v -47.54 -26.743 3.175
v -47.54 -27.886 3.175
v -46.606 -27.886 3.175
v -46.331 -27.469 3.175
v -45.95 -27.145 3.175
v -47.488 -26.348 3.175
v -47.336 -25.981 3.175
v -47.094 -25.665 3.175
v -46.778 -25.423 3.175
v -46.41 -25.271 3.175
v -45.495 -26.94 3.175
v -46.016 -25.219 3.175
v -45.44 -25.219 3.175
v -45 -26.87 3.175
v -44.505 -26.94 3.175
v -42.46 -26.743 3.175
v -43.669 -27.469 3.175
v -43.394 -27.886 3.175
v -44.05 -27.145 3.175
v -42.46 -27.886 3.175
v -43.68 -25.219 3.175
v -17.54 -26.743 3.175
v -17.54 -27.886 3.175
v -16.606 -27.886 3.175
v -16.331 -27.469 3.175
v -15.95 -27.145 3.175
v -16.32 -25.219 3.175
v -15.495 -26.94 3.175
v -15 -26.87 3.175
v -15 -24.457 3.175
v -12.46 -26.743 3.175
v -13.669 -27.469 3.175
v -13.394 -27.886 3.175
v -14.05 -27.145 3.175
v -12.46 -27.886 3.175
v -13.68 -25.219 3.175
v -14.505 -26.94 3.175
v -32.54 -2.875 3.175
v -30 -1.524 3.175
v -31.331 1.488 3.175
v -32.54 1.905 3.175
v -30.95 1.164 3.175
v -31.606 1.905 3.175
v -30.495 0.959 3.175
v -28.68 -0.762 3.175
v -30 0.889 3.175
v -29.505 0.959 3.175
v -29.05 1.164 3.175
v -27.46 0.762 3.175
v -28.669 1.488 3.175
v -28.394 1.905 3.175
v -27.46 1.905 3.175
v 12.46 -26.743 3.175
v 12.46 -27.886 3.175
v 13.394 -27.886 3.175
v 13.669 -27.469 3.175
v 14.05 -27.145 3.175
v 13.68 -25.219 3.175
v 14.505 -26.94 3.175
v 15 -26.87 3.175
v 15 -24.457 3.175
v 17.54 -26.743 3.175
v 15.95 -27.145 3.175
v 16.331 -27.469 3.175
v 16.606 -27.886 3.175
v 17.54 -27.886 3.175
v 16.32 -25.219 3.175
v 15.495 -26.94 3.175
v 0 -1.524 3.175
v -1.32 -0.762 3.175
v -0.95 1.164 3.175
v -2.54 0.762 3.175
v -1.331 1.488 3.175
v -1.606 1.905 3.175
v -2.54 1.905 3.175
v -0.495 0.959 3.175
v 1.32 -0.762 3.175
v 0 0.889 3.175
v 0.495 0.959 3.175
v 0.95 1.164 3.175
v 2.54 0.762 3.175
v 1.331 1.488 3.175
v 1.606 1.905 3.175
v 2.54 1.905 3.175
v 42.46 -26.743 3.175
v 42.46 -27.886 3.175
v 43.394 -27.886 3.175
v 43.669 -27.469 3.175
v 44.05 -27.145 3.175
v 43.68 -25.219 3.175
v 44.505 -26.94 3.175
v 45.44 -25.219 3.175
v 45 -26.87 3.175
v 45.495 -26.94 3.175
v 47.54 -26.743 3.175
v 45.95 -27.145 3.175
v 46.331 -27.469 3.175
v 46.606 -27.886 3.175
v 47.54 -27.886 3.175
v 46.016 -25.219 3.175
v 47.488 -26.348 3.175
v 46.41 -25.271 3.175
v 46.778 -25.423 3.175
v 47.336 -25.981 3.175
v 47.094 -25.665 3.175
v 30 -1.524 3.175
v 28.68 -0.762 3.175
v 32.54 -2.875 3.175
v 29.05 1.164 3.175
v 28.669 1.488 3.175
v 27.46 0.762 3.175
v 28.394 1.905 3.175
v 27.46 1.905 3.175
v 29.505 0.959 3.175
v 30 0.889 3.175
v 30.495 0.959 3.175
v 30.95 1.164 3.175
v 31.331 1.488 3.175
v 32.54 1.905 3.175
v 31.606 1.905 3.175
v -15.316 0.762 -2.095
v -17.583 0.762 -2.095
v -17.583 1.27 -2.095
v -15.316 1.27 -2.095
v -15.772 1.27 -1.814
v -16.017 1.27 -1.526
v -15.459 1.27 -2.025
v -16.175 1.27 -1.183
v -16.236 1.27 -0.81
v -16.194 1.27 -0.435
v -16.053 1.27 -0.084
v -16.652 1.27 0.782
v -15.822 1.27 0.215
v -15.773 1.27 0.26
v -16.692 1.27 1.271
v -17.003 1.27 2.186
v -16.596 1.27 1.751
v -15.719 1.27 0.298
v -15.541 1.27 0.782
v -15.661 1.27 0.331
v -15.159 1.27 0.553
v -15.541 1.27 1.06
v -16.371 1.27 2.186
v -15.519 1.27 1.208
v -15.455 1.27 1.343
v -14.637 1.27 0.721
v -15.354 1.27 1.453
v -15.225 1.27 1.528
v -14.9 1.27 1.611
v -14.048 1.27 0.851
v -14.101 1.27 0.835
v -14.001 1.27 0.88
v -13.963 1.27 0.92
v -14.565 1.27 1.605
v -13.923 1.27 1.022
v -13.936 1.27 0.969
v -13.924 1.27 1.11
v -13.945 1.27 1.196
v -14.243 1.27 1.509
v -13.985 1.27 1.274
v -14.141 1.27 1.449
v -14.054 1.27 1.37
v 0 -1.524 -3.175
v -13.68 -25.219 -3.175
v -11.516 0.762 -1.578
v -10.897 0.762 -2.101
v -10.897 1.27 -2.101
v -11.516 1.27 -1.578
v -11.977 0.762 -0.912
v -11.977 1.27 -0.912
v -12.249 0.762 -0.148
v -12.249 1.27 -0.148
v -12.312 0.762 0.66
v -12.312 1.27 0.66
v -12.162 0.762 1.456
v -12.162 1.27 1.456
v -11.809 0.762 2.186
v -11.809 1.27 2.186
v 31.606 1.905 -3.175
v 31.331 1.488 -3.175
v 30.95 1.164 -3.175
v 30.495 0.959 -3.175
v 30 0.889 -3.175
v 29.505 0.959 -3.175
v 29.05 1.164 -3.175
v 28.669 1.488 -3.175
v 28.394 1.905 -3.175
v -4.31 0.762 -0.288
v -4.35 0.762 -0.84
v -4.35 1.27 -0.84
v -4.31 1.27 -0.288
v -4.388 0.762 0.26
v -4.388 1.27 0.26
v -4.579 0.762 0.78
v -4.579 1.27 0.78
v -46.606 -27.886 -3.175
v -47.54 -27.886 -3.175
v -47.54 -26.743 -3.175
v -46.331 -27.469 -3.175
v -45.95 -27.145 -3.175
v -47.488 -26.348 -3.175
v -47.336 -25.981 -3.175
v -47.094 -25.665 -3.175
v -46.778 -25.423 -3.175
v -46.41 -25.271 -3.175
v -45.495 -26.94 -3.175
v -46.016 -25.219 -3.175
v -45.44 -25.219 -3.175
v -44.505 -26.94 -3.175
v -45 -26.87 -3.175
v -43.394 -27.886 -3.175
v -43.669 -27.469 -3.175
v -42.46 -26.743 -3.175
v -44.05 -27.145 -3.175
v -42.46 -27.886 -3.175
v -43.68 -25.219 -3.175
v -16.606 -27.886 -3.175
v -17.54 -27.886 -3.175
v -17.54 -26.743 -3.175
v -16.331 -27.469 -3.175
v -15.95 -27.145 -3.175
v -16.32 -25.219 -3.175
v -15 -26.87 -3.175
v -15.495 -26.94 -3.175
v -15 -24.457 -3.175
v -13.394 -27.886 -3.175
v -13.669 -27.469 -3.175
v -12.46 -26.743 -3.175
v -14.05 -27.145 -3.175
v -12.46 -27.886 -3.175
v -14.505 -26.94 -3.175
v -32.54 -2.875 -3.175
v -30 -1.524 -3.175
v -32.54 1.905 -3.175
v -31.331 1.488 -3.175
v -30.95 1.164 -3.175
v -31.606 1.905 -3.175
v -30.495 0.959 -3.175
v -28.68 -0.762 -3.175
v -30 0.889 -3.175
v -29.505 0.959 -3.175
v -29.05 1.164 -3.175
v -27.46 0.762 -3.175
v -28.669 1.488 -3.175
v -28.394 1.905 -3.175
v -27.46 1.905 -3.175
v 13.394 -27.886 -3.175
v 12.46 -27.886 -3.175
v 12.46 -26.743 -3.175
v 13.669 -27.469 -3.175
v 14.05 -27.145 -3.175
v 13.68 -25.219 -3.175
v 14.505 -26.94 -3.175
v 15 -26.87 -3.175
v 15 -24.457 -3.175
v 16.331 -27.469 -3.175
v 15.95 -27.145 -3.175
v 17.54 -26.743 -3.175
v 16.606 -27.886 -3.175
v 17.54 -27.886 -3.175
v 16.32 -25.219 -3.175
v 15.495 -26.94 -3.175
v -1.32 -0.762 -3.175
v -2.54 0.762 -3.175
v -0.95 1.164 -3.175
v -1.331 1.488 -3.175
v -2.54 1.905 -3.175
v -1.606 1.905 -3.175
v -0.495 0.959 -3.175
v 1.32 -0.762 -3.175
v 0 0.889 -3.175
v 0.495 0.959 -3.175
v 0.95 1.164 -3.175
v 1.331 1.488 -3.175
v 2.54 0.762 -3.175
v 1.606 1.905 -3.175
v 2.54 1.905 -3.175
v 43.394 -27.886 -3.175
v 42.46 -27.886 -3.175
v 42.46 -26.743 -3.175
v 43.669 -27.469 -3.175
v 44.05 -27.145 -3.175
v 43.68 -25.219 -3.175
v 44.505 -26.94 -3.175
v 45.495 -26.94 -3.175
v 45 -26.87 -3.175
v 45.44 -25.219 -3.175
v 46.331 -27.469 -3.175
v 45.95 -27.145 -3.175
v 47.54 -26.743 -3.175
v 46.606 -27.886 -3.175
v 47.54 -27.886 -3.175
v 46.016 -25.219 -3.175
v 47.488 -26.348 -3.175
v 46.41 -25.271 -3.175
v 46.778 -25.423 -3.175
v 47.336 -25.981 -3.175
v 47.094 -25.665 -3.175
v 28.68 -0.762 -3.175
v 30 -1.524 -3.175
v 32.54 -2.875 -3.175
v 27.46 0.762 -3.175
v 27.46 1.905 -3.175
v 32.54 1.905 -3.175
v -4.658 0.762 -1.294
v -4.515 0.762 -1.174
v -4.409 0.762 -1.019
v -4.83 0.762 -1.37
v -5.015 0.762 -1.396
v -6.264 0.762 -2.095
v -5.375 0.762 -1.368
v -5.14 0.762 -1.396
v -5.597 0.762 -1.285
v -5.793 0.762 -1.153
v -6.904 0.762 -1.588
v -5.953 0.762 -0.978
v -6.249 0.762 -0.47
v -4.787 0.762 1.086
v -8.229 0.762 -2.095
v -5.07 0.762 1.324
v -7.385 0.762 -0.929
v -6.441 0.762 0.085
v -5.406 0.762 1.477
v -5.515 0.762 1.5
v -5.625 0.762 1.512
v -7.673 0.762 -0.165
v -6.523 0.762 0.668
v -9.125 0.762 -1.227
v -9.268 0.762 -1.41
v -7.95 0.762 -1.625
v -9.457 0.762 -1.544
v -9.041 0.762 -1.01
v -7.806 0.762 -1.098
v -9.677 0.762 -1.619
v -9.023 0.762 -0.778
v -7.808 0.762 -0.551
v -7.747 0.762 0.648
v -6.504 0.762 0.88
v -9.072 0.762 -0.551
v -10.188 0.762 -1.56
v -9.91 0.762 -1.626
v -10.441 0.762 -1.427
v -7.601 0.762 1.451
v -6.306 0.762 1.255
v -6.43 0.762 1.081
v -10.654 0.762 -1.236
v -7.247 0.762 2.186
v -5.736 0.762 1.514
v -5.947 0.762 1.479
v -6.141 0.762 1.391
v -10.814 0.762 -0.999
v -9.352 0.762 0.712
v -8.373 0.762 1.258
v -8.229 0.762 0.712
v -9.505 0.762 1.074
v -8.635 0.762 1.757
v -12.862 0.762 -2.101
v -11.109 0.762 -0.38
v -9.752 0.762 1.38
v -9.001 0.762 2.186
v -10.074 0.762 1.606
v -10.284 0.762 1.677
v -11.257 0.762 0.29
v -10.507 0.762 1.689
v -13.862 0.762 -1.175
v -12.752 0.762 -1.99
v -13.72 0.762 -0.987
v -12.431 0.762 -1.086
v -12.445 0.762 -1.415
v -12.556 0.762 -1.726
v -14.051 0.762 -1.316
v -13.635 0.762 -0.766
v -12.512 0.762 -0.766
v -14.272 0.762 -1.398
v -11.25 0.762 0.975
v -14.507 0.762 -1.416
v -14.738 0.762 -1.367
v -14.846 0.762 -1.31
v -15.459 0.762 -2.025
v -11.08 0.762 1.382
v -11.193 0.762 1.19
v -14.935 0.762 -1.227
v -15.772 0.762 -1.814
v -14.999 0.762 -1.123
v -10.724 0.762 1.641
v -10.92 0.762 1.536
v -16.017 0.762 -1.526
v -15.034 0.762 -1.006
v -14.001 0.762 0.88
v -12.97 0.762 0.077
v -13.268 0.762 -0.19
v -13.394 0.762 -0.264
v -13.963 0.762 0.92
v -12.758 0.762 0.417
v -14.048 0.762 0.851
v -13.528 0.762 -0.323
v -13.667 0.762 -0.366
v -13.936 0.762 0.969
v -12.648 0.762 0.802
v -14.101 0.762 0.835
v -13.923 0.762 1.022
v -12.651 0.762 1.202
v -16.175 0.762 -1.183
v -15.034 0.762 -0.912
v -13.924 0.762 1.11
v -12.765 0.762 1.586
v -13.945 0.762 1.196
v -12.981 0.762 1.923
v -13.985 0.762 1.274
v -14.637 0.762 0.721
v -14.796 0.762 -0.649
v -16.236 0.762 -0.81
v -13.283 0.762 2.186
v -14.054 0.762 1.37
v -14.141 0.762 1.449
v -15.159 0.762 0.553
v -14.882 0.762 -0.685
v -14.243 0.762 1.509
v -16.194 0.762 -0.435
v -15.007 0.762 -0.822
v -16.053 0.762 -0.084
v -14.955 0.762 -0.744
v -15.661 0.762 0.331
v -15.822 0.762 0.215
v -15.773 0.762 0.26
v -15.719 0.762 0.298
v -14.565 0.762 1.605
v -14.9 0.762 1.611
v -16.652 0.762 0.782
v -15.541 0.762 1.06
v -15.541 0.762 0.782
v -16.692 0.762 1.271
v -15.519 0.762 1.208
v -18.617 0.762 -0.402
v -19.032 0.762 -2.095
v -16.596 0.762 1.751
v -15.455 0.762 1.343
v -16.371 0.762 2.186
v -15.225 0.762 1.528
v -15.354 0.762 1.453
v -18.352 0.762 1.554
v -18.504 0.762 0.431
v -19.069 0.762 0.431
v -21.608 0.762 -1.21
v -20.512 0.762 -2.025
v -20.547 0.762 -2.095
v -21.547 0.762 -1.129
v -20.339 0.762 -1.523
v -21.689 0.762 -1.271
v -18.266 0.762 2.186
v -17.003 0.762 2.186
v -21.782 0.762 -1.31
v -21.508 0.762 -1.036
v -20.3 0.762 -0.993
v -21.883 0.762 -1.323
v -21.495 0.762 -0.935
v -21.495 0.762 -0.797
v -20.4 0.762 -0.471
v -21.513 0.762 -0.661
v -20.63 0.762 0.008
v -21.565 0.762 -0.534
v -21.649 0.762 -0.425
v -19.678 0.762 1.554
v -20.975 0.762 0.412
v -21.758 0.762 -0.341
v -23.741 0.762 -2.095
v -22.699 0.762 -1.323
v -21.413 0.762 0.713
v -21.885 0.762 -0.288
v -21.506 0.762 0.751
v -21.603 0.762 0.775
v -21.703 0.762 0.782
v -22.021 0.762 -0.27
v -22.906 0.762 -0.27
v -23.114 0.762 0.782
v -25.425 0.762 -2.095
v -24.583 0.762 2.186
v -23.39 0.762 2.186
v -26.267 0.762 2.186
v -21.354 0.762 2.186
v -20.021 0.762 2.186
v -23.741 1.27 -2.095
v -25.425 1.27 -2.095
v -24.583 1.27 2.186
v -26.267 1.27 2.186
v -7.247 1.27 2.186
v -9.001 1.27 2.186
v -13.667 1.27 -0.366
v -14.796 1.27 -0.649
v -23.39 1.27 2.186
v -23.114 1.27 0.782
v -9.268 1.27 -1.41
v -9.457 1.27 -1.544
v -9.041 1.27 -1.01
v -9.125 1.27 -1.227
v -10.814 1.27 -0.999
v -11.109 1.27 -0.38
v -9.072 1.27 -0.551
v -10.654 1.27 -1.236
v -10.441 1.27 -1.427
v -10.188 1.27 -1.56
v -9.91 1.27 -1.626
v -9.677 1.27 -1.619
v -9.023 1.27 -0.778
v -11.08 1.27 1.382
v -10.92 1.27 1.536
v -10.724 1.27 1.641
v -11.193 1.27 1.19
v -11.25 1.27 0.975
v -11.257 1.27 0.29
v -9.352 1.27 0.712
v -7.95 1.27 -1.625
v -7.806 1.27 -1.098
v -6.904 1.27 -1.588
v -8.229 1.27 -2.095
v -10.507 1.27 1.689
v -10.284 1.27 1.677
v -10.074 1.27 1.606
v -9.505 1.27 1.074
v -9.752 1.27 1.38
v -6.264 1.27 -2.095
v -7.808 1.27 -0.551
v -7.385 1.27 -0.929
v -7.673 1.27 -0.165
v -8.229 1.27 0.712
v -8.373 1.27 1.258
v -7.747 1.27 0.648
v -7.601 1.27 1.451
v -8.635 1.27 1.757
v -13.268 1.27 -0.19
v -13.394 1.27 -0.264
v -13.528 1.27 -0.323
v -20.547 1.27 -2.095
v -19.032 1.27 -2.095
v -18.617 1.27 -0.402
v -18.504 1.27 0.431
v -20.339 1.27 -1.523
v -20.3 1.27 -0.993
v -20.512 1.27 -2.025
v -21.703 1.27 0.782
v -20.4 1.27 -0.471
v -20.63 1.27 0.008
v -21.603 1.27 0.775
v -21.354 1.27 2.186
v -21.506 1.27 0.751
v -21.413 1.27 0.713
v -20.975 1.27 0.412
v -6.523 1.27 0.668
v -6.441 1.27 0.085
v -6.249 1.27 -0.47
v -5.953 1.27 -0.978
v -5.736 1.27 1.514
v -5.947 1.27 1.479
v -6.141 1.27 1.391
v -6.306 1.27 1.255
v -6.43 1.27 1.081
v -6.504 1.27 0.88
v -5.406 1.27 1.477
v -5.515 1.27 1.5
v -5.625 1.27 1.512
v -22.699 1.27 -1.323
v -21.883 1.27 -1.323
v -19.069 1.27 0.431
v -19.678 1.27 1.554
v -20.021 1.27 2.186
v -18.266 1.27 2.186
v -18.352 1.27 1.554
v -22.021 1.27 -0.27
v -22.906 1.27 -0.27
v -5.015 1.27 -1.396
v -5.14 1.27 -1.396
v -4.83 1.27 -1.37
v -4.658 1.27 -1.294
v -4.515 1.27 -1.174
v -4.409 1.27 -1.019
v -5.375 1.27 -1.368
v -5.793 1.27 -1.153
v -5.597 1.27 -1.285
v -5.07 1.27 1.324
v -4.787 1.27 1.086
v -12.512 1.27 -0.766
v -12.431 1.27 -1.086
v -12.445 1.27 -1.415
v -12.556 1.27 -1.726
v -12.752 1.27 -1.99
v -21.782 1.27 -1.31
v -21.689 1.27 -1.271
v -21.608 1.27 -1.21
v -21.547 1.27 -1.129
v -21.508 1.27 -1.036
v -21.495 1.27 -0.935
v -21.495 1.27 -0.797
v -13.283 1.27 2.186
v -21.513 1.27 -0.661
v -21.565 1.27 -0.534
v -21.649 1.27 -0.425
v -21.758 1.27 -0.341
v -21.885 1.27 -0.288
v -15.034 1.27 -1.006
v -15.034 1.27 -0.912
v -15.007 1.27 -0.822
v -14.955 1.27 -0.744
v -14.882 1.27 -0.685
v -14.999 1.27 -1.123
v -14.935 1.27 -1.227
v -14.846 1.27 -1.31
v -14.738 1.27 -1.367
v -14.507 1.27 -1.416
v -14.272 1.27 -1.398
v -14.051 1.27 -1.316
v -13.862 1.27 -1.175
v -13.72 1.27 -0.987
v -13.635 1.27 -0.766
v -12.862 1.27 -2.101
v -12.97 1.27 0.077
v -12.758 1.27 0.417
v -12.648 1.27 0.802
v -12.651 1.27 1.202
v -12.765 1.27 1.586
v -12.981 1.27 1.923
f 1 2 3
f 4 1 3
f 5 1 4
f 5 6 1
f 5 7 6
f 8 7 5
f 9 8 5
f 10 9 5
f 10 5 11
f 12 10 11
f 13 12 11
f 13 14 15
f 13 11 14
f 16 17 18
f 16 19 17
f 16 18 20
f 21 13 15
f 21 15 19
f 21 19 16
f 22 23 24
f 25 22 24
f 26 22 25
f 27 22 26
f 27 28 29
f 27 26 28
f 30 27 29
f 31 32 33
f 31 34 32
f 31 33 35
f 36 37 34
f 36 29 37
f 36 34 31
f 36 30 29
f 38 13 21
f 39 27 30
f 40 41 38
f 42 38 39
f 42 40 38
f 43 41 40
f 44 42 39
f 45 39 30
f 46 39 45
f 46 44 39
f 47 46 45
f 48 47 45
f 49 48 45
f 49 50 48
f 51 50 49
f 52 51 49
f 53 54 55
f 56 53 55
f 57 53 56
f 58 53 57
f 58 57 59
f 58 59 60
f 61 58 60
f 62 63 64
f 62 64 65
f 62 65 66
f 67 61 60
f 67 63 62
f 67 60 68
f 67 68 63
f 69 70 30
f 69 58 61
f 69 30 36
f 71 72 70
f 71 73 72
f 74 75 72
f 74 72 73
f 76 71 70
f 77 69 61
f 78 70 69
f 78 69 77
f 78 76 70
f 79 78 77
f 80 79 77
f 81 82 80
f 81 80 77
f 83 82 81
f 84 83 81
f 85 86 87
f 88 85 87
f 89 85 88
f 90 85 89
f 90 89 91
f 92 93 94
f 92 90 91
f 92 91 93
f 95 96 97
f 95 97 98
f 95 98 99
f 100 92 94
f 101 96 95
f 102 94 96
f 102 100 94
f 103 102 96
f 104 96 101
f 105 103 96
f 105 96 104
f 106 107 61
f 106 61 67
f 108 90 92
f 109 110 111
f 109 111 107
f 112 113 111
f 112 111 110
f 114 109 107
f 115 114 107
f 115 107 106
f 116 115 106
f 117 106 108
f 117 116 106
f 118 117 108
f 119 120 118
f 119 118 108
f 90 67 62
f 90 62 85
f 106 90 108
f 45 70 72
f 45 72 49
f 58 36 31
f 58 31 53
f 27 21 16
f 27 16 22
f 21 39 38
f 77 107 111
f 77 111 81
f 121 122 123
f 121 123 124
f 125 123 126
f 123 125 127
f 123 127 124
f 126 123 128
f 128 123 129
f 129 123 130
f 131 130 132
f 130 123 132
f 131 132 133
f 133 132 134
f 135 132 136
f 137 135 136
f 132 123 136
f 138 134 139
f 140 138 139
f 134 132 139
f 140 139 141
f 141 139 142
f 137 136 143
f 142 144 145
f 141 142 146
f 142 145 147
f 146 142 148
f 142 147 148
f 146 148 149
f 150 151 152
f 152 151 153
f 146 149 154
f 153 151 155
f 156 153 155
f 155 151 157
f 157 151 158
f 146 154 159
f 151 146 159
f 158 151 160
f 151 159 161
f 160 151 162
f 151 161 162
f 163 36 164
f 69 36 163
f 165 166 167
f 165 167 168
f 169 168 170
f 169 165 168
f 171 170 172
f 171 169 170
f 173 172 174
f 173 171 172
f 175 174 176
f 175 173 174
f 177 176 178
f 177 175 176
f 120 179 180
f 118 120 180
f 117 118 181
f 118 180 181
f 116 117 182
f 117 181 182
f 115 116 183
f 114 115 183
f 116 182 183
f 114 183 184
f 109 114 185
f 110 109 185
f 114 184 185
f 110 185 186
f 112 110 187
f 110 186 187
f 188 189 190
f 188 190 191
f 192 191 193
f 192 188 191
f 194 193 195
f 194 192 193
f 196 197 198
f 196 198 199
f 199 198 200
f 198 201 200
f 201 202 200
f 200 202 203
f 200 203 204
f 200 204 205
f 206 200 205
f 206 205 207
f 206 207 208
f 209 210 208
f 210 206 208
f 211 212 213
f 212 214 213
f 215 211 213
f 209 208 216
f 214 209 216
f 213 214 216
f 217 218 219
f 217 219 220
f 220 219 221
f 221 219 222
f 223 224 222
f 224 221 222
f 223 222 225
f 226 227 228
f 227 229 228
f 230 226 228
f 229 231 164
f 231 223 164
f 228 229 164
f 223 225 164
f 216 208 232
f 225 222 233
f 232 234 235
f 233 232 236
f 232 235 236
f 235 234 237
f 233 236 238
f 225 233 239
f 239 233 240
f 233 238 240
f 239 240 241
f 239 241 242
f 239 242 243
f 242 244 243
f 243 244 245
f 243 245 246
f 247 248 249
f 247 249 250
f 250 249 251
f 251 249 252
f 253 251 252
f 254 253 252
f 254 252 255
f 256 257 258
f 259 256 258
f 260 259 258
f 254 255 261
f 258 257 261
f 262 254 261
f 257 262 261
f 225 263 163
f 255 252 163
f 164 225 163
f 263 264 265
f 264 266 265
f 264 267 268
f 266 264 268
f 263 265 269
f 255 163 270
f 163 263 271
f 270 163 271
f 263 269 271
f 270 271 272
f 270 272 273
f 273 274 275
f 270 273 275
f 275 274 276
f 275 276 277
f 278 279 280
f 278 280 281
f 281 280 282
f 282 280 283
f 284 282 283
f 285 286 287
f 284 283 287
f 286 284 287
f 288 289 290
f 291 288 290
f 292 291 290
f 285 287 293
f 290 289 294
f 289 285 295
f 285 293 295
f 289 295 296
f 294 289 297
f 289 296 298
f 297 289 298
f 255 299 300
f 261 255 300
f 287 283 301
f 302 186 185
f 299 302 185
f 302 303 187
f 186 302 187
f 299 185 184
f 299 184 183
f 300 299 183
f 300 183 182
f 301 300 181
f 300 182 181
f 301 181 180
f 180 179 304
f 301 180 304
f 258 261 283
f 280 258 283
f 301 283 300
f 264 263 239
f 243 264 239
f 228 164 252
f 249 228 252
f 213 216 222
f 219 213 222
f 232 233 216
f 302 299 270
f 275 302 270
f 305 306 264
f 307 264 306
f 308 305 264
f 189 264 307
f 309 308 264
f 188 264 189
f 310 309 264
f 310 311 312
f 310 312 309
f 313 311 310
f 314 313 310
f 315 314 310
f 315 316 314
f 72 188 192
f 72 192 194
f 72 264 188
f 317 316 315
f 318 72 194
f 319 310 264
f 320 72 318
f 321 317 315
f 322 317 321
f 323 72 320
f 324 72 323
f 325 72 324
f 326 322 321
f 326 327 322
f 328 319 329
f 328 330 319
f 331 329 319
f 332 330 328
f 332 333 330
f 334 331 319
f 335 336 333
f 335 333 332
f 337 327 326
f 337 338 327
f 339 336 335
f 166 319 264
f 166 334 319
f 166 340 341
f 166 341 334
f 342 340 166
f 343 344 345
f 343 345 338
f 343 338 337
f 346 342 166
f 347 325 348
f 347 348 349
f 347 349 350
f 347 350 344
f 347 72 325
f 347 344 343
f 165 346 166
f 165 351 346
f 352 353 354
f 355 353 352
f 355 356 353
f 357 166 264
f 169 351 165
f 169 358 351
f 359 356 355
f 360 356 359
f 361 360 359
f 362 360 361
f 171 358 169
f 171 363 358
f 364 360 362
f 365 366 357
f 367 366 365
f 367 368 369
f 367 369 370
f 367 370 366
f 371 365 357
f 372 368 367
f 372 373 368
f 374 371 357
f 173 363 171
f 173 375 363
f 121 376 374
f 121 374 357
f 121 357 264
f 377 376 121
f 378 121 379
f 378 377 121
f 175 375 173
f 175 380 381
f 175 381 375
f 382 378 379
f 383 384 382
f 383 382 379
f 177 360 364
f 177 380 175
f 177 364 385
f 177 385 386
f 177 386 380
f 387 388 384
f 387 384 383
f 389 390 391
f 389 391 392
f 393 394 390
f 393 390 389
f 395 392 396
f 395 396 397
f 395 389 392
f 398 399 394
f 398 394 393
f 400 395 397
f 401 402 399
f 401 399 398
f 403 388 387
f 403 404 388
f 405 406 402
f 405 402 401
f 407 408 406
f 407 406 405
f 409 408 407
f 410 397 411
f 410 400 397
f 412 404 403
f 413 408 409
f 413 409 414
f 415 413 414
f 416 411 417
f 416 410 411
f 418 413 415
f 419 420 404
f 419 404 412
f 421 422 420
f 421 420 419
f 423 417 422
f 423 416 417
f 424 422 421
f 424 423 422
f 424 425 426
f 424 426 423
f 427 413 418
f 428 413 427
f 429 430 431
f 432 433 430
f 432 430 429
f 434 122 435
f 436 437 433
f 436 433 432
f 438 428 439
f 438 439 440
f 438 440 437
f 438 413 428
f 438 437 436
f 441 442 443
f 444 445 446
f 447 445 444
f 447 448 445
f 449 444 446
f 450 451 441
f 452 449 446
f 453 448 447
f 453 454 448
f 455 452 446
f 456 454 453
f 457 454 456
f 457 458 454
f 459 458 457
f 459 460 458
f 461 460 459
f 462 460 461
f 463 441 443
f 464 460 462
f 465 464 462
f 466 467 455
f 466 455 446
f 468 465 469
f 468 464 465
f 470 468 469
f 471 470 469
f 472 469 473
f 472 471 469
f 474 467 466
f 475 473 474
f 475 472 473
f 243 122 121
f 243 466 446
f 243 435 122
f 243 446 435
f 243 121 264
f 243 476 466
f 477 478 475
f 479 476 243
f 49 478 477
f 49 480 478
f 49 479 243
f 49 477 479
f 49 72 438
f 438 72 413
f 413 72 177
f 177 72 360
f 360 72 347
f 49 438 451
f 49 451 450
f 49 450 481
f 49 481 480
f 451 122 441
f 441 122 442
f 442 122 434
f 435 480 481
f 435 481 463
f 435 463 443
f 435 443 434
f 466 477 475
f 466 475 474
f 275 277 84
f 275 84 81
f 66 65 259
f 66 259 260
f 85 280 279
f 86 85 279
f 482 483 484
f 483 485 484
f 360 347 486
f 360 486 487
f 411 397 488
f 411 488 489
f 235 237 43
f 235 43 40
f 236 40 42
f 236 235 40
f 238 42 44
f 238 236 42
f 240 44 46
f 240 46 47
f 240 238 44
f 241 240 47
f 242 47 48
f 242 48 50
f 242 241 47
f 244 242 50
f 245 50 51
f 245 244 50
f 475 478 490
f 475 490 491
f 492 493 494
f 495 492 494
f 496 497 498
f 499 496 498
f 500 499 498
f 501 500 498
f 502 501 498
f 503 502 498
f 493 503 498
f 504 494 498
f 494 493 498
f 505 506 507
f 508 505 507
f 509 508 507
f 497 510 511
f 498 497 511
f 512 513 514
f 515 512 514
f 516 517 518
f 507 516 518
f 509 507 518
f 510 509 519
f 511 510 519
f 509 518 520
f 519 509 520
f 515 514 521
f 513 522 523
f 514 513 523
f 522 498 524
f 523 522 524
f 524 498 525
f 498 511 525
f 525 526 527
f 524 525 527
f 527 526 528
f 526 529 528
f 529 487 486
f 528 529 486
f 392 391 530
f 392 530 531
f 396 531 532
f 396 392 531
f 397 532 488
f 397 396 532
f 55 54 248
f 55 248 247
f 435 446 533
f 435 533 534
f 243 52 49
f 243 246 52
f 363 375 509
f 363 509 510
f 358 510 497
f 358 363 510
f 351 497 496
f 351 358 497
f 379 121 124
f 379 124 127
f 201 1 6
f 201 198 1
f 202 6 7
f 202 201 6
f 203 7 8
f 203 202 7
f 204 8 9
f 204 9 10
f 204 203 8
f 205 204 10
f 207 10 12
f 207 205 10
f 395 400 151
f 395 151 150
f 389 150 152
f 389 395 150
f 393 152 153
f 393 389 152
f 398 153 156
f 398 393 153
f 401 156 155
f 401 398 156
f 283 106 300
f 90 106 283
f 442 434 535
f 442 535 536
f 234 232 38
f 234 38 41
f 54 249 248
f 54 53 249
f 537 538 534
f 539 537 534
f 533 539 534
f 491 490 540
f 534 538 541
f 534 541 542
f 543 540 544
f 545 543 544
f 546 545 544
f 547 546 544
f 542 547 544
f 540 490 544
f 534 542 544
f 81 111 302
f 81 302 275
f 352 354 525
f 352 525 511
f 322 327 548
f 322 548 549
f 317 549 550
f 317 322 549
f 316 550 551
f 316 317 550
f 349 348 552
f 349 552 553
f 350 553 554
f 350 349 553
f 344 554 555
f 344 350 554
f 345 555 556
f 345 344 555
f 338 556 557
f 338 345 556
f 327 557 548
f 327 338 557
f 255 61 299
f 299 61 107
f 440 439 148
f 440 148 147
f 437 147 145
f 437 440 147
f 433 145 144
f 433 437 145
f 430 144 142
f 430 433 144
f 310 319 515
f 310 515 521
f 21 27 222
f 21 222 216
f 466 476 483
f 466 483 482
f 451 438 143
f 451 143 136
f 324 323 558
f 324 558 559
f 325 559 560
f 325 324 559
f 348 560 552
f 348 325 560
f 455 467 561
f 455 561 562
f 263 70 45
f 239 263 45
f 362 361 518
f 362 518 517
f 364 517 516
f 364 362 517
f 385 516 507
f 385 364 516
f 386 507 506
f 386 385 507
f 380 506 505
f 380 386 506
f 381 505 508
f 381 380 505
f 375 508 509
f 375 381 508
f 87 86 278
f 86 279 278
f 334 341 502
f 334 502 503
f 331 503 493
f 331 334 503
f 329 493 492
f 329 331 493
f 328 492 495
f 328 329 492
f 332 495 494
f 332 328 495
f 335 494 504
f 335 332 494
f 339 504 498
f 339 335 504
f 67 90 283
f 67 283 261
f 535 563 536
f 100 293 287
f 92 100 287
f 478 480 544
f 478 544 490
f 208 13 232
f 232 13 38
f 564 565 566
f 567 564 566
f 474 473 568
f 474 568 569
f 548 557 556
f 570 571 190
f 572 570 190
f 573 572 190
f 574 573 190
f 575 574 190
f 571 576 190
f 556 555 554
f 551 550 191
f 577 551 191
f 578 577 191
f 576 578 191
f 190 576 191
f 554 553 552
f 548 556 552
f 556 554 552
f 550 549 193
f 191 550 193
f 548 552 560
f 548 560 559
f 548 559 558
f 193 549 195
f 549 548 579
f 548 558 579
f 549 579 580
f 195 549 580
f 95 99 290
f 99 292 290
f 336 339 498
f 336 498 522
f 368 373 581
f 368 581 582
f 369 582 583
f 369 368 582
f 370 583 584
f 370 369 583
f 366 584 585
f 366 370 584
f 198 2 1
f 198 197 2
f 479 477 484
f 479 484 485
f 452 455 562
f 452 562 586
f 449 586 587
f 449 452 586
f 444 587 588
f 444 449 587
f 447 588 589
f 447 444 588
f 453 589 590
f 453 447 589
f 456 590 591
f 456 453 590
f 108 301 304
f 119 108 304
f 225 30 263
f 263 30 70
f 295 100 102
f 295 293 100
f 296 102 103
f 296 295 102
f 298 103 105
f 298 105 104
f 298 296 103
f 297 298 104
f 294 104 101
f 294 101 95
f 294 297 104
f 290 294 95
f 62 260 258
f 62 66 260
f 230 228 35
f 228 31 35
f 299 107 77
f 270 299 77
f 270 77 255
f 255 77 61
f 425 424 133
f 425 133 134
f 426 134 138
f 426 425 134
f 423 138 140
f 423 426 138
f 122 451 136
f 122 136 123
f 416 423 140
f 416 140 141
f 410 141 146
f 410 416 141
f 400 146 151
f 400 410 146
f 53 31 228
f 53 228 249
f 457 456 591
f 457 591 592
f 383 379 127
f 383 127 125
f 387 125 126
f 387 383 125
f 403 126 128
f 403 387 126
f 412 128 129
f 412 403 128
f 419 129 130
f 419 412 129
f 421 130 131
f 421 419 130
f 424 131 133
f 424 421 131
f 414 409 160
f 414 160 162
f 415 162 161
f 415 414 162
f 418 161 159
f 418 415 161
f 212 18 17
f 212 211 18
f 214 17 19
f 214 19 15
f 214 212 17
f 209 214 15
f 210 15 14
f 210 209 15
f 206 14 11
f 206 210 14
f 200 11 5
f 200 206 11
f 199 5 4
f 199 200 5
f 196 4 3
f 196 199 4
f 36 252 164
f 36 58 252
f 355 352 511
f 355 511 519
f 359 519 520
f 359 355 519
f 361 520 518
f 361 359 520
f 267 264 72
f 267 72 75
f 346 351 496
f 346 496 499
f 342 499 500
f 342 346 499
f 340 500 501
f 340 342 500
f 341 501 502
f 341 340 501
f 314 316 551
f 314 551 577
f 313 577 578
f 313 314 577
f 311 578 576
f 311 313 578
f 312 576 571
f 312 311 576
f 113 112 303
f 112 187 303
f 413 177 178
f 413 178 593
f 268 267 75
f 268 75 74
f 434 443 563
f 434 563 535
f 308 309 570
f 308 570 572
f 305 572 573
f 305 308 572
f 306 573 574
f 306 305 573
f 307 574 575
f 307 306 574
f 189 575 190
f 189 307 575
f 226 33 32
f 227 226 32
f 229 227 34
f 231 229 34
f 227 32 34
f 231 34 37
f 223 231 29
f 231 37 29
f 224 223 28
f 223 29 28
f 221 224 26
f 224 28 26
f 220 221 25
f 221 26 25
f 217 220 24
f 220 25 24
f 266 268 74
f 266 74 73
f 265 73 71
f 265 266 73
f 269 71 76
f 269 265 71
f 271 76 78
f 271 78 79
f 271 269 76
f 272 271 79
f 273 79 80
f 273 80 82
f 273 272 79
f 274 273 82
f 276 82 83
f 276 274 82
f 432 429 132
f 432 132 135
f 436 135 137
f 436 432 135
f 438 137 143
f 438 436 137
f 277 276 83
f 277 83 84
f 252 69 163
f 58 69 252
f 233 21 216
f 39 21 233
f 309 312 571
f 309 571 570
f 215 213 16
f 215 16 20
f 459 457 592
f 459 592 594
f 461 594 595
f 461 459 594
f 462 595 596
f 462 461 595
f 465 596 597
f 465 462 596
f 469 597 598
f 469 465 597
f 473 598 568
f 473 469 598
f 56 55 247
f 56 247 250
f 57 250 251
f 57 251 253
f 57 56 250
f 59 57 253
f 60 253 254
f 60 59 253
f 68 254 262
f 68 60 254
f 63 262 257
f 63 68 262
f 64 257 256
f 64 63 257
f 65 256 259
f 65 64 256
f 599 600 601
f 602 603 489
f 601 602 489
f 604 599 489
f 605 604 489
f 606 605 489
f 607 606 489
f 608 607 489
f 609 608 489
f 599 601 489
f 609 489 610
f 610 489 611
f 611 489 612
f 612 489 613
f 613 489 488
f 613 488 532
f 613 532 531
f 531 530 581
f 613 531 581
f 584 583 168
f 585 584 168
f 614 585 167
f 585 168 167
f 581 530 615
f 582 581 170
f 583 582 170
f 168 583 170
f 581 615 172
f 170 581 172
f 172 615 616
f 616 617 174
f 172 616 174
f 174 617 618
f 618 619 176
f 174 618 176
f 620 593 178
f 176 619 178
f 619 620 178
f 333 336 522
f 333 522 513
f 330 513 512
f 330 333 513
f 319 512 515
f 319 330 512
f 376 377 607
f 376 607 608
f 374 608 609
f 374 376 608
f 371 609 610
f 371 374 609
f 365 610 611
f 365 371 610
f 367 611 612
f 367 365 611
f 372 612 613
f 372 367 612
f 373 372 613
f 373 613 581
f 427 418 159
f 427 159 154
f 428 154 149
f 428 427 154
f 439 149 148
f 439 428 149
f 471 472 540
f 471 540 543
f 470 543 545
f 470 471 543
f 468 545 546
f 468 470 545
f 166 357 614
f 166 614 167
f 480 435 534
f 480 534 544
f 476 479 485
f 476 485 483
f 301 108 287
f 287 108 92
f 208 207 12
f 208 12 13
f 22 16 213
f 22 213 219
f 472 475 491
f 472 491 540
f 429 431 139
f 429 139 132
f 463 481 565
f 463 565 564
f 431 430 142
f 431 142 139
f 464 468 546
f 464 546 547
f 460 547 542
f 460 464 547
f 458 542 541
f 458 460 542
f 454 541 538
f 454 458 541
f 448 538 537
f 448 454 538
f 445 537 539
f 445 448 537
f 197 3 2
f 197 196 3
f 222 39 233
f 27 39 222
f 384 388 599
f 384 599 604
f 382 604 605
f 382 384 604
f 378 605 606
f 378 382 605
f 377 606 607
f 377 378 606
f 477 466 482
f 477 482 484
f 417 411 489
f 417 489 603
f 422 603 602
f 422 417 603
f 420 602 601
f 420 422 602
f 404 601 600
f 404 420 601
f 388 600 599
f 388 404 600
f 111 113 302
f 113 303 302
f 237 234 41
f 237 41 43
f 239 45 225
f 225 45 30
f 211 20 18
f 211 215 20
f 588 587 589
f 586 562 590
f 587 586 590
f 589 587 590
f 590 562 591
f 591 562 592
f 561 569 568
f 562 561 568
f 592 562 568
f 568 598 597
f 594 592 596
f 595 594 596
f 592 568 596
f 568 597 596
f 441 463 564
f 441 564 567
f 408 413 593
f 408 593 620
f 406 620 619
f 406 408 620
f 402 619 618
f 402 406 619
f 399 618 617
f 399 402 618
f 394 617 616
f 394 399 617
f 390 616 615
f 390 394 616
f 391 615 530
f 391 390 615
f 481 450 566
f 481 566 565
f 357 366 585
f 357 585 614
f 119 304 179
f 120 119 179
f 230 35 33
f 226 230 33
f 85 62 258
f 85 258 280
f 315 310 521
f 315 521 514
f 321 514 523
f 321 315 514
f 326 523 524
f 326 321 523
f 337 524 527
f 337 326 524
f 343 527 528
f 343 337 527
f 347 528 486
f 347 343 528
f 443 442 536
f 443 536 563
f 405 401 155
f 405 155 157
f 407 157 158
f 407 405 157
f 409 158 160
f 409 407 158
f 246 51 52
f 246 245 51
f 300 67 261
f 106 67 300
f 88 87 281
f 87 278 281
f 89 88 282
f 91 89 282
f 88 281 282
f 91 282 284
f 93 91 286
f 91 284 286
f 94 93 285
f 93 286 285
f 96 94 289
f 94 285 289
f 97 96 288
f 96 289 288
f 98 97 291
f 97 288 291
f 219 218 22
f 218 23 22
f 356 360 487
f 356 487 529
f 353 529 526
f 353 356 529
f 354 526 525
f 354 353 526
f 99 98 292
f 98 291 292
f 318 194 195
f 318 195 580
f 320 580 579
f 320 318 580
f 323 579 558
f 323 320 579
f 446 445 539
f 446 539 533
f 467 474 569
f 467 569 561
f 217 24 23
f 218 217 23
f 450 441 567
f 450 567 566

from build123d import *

# Parameters (mm, degrees)
BOSS_EXTRUDE1_DEPTH  = 3.175
BOSS_EXTRUDE2_DEPTH  = 3.175
BOSS_EXTRUDE3_START  = -3.175
BOSS_EXTRUDE3_DEPTH  = 6.35
FILLET1_R            = 1.524
FILLET1_OF_MIRROR1_R = 1.524
BOSS_EXTRUDE4_DEPTH  = 0.508


with BuildPart() as part:
    # Sketch1 → Boss-Extrude1 (new body, symmetric)
    with BuildSketch(Plane.XY):
        Polygon((-46.319822715, -26.742762114), (-30.439940905, 0.762), (0, 0.762), (30.439940905, 0.762), (46.319822715, -26.742762114), (15, -26.742762114), (-15, -26.742762114), align=None)
        Polygon((-43.680177285, -25.218762114), (-30, -1.524), (-16.319822715, -25.218762114), align=None, mode=Mode.SUBTRACT)
        Polygon((-28.680177285, -0.762), (-15, -24.456762114), (-1.319822715, -0.762), align=None, mode=Mode.SUBTRACT)
        Polygon((-13.680177285, -25.218762114), (0, -1.524), (13.680177285, -25.218762114), align=None, mode=Mode.SUBTRACT)
        Polygon((1.319822715, -0.762), (15, -24.456762114), (28.680177285, -0.762), align=None, mode=Mode.SUBTRACT)
        Polygon((16.319822715, -25.218762114), (30, -1.524), (43.680177285, -25.218762114), align=None, mode=Mode.SUBTRACT)
    extrude(amount=BOSS_EXTRUDE1_DEPTH, both=True)

    # Sketch2 → Boss-Extrude2 (add, symmetric)
    with BuildSketch(Plane.XY):
        with BuildLine():
            Line((-46.606437051, -27.885762114), (-47.54, -27.885762114))
            Line((-47.54, -27.885762114), (-47.54, -25.218762114))
            Line((-47.54, -25.218762114), (-42.46, -25.218762114))
            Line((-42.46, -25.218762114), (-42.46, -27.885762114))
            Line((-42.46, -27.885762114), (-43.393562949, -27.885762114))
            ThreePointArc((-43.393562949, -27.885762114), (-45, -26.869762114), (-46.606437051, -27.885762114))
        make_face()
        with BuildLine():
            Line((-27.46, 0.762), (-30.439940905, 0.762))
            Line((-30.439940905, 0.762), (-32.54, -2.875409051))
            Line((-32.54, -2.875409051), (-32.54, 0.762))
            Line((-32.54, 0.762), (-32.54, 1.905))
            Line((-32.54, 1.905), (-31.606437051, 1.905))
            ThreePointArc((-31.606437051, 1.905), (-30, 0.889), (-28.393562949, 1.905))
            Line((-28.393562949, 1.905), (-27.46, 1.905))
            Line((-27.46, 1.905), (-27.46, 0.762))
        make_face()
        with BuildLine():
            Line((-16.606437051, -27.885762114), (-17.54, -27.885762114))
            Line((-17.54, -27.885762114), (-17.54, -26.742762114))
            Line((-17.54, -26.742762114), (-12.46, -26.742762114))
            Line((-12.46, -26.742762114), (-12.46, -27.885762114))
            Line((-12.46, -27.885762114), (-13.393562949, -27.885762114))
            ThreePointArc((-13.393562949, -27.885762114), (-15, -26.869762114), (-16.606437051, -27.885762114))
        make_face()
    boss_extrude2 = extrude(amount=BOSS_EXTRUDE2_DEPTH, both=True)

    # Sketch3 → Boss-Extrude3 (add)
    with BuildSketch(Plane.XY.offset(BOSS_EXTRUDE3_START)):
        with BuildLine():
            Line((1.606437051, 1.905), (2.54, 1.905))
            Line((2.54, 1.905), (2.54, 0.762))
            Line((2.54, 0.762), (-2.54, 0.762))
            Line((-2.54, 0.762), (-2.54, 1.905))
            Line((-2.54, 1.905), (-1.606437051, 1.905))
            ThreePointArc((-1.606437051, 1.905), (0, 0.889), (1.606437051, 1.905))
        make_face()
    extrude(amount=BOSS_EXTRUDE3_DEPTH)

    # Fillet1
    fillet1_edges = [part.edges().sort_by_distance(p)[0] for p in [
        (-47.54, -25.218762114, 0),
    ]]
    fillet(fillet1_edges, radius=FILLET1_R)

    # Mirror1: Boss-Extrude2 across plane
    add(boss_extrude2.mirror(Plane(origin=(0, 0, 0), x_dir=(0, 0, 1), z_dir=(1, 0, 0))))

    # Fillet1 of Mirror1
    fillet1_of_mirror1_edges = [part.edges().sort_by_distance(p)[0] for p in [
        (47.54, -25.218762114, 0),
    ]]
    fillet(fillet1_of_mirror1_edges, radius=FILLET1_OF_MIRROR1_R)

    # Sketch4 → Boss-Extrude4 (add)
    with BuildSketch(Plane(origin=(30.341470111, 0.762, -10.998323426), x_dir=(-1, 0, 0), z_dir=(0, 1, 0))):
        Polygon((55.766638301, 8.903049935), (54.0821519, 8.903049935), (54.924395101, 13.184452869), (56.608881501, 13.184452869), align=None)
        with BuildLine():
            Line((49.373679321, 8.903049935), (51.695796166, 13.184452869))
            Line((51.695796166, 13.184452869), (53.731217234, 13.184452869))
            Line((53.731217234, 13.184452869), (53.455071922, 11.780714202))
            Line((53.455071922, 11.780714202), (52.044845481, 11.780714202))
            ThreePointArc((52.044845481, 11.780714202), (51.895660414, 11.763021636), (51.754751921, 11.710925494))
            ThreePointArc((51.754751921, 11.710925494), (50.74099205, 10.52746368), (50.853552966, 8.973236868))
            Line((50.853552966, 8.973236868), (50.888554794, 8.903049935))
            Line((50.888554794, 8.903049935), (49.373679321, 8.903049935))
        make_face()
        with BuildLine():
            Line((47.344206299, 13.184452869), (47.92473551, 8.903049935))
            Line((47.92473551, 8.903049935), (45.657455804, 8.903049935))
            Line((45.657455804, 8.903049935), (45.800093765, 8.973236868))
            ThreePointArc((45.800093765, 8.973236868), (46.559919921, 9.999679495), (46.16385217, 11.213784347))
            ThreePointArc((46.16385217, 11.213784347), (46.087708374, 11.278047887), (46.002485287, 11.329668676))
            ThreePointArc((46.002485287, 11.329668676), (45.241879319, 11.641820064), (44.44239948, 11.833632247))
            ThreePointArc((44.44239948, 11.833632247), (44.321830206, 11.897125178), (44.264573877, 12.020777977))
            ThreePointArc((44.264573877, 12.020777977), (44.273299822, 12.151811254), (44.326168164, 12.272022736))
            ThreePointArc((44.326168164, 12.272022736), (44.436687002, 12.409847066), (44.584321098, 12.50687352))
            ThreePointArc((44.584321098, 12.50687352), (45.07356558, 12.617554773), (45.566896159, 12.526805434))
            ThreePointArc((45.566896159, 12.526805434), (45.796502387, 12.340831934), (45.882880346, 12.05826511))
            Line((45.882880346, 12.05826511), (45.882880346, 11.780714202))
            Line((45.882880346, 11.780714202), (46.993271632, 11.780714202))
            ThreePointArc((46.993271632, 11.780714202), (47.00184458, 12.512372899), (46.712523898, 13.184452869))
            Line((46.712523898, 13.184452869), (47.344206299, 13.184452869))
        make_face()
        with BuildLine():
            Line((52.362572033, 10.727910202), (53.247962938, 10.727910202))
            Line((53.247962938, 10.727910202), (53.040853955, 9.675106202))
            Line((53.040853955, 9.675106202), (52.224130208, 9.675106202))
            ThreePointArc((52.224130208, 9.675106202), (51.949800938, 9.788737106), (51.836170033, 10.063066377))
            Line((51.836170033, 10.063066377), (51.836170033, 10.201508202))
            ThreePointArc((51.836170033, 10.201508202), (51.990349609, 10.573730626), (52.362572033, 10.727910202))
        make_face()
        Polygon((48.958505766, 10.596309702), (48.845492907, 11.429779536), (49.410557201, 11.429779536), align=None)
        Polygon((48.607571099, 13.184452869), (50.362244433, 13.184452869), (50.019637029, 12.552770469), (48.69322295, 12.552770469), align=None)
        with BuildLine():
            Line((43.093358174, 9.007864255), (43.203837606, 8.897384823))
            Line((43.203837606, 8.897384823), (41.238603472, 8.897384823))
            ThreePointArc((41.238603472, 8.897384823), (42.59037643, 10.850382179), (42.150373231, 13.184452869))
            Line((42.150373231, 13.184452869), (43.624298831, 13.184452869))
            ThreePointArc((43.624298831, 13.184452869), (42.976922737, 12.00046329), (43.609533036, 10.808518937))
            ThreePointArc((43.609533036, 10.808518937), (43.801404112, 10.703005905), (44.00849344, 10.63186155))
            Line((44.00849344, 10.63186155), (45.137184548, 10.349688773))
            ThreePointArc((45.137184548, 10.349688773), (45.325274084, 10.217067986), (45.375126192, 9.992388851))
            ThreePointArc((45.375126192, 9.992388851), (45.276758726, 9.771226443), (45.079326395, 9.631192719))
            ThreePointArc((45.079326395, 9.631192719), (44.392498989, 9.682709209), (43.976922089, 10.231964773))
            Line((43.976922089, 10.231964773), (42.853931155, 10.231964773))
            ThreePointArc((42.853931155, 10.231964773), (42.786913393, 9.583390951), (43.093358174, 9.007864255))
        make_face()
        with BuildLine():
            Line((38.57083963, 8.903049935), (36.605605496, 8.903049935))
            ThreePointArc((36.605605496, 8.903049935), (38.014670833, 10.833118693), (37.588222563, 13.184452869))
            Line((37.588222563, 13.184452869), (39.342895896, 13.184452869))
            ThreePointArc((39.342895896, 13.184452869), (38.831372076, 12.513225905), (38.57083963, 11.710527269))
            Line((38.57083963, 11.710527269), (39.693830563, 11.710527269))
            ThreePointArc((39.693830563, 11.710527269), (39.959617235, 12.233880985), (40.415270694, 12.603910164))
            ThreePointArc((40.415270694, 12.603910164), (41.166876497, 12.593701608), (41.591788981, 11.973649288))
            ThreePointArc((41.591788981, 11.973649288), (41.543037796, 10.949193829), (41.155213354, 9.999731945))
            ThreePointArc((41.155213354, 9.999731945), (40.782487914, 9.571566118), (40.251107207, 9.371854393))
            ThreePointArc((40.251107207, 9.371854393), (39.531077174, 9.674914925), (39.41308283, 10.447162469))
            Line((39.41308283, 10.447162469), (38.149718029, 10.447162469))
            ThreePointArc((38.149718029, 10.447162469), (38.201808334, 9.631886976), (38.57083963, 8.903049935))
        make_face()
        with BuildLine():
            Line((35.48104333, 9.602571887), (35.356873428, 9.602571887))
            ThreePointArc((35.356873428, 9.602571887), (34.923728887, 9.759646665), (34.691948891, 10.157848515))
            ThreePointArc((34.691948891, 10.157848515), (34.675735454, 10.986379145), (34.920455715, 11.778110082))
            ThreePointArc((34.920455715, 11.778110082), (35.261440878, 12.213116508), (35.747757566, 12.475790357))
            ThreePointArc((35.747757566, 12.475790357), (35.911443016, 12.505405638), (36.077655631, 12.511990293))
            ThreePointArc((36.077655631, 12.511990293), (36.647671195, 12.253324316), (36.864077445, 11.665962276))
            ThreePointArc((36.864077445, 11.665962276), (36.699639375, 10.801331502), (36.294750409, 10.019864179))
            ThreePointArc((36.294750409, 10.019864179), (35.938277424, 9.712977507), (35.48104333, 9.602571887))
        make_face()
    extrude(amount=BOSS_EXTRUDE4_DEPTH)


solid = part.part
